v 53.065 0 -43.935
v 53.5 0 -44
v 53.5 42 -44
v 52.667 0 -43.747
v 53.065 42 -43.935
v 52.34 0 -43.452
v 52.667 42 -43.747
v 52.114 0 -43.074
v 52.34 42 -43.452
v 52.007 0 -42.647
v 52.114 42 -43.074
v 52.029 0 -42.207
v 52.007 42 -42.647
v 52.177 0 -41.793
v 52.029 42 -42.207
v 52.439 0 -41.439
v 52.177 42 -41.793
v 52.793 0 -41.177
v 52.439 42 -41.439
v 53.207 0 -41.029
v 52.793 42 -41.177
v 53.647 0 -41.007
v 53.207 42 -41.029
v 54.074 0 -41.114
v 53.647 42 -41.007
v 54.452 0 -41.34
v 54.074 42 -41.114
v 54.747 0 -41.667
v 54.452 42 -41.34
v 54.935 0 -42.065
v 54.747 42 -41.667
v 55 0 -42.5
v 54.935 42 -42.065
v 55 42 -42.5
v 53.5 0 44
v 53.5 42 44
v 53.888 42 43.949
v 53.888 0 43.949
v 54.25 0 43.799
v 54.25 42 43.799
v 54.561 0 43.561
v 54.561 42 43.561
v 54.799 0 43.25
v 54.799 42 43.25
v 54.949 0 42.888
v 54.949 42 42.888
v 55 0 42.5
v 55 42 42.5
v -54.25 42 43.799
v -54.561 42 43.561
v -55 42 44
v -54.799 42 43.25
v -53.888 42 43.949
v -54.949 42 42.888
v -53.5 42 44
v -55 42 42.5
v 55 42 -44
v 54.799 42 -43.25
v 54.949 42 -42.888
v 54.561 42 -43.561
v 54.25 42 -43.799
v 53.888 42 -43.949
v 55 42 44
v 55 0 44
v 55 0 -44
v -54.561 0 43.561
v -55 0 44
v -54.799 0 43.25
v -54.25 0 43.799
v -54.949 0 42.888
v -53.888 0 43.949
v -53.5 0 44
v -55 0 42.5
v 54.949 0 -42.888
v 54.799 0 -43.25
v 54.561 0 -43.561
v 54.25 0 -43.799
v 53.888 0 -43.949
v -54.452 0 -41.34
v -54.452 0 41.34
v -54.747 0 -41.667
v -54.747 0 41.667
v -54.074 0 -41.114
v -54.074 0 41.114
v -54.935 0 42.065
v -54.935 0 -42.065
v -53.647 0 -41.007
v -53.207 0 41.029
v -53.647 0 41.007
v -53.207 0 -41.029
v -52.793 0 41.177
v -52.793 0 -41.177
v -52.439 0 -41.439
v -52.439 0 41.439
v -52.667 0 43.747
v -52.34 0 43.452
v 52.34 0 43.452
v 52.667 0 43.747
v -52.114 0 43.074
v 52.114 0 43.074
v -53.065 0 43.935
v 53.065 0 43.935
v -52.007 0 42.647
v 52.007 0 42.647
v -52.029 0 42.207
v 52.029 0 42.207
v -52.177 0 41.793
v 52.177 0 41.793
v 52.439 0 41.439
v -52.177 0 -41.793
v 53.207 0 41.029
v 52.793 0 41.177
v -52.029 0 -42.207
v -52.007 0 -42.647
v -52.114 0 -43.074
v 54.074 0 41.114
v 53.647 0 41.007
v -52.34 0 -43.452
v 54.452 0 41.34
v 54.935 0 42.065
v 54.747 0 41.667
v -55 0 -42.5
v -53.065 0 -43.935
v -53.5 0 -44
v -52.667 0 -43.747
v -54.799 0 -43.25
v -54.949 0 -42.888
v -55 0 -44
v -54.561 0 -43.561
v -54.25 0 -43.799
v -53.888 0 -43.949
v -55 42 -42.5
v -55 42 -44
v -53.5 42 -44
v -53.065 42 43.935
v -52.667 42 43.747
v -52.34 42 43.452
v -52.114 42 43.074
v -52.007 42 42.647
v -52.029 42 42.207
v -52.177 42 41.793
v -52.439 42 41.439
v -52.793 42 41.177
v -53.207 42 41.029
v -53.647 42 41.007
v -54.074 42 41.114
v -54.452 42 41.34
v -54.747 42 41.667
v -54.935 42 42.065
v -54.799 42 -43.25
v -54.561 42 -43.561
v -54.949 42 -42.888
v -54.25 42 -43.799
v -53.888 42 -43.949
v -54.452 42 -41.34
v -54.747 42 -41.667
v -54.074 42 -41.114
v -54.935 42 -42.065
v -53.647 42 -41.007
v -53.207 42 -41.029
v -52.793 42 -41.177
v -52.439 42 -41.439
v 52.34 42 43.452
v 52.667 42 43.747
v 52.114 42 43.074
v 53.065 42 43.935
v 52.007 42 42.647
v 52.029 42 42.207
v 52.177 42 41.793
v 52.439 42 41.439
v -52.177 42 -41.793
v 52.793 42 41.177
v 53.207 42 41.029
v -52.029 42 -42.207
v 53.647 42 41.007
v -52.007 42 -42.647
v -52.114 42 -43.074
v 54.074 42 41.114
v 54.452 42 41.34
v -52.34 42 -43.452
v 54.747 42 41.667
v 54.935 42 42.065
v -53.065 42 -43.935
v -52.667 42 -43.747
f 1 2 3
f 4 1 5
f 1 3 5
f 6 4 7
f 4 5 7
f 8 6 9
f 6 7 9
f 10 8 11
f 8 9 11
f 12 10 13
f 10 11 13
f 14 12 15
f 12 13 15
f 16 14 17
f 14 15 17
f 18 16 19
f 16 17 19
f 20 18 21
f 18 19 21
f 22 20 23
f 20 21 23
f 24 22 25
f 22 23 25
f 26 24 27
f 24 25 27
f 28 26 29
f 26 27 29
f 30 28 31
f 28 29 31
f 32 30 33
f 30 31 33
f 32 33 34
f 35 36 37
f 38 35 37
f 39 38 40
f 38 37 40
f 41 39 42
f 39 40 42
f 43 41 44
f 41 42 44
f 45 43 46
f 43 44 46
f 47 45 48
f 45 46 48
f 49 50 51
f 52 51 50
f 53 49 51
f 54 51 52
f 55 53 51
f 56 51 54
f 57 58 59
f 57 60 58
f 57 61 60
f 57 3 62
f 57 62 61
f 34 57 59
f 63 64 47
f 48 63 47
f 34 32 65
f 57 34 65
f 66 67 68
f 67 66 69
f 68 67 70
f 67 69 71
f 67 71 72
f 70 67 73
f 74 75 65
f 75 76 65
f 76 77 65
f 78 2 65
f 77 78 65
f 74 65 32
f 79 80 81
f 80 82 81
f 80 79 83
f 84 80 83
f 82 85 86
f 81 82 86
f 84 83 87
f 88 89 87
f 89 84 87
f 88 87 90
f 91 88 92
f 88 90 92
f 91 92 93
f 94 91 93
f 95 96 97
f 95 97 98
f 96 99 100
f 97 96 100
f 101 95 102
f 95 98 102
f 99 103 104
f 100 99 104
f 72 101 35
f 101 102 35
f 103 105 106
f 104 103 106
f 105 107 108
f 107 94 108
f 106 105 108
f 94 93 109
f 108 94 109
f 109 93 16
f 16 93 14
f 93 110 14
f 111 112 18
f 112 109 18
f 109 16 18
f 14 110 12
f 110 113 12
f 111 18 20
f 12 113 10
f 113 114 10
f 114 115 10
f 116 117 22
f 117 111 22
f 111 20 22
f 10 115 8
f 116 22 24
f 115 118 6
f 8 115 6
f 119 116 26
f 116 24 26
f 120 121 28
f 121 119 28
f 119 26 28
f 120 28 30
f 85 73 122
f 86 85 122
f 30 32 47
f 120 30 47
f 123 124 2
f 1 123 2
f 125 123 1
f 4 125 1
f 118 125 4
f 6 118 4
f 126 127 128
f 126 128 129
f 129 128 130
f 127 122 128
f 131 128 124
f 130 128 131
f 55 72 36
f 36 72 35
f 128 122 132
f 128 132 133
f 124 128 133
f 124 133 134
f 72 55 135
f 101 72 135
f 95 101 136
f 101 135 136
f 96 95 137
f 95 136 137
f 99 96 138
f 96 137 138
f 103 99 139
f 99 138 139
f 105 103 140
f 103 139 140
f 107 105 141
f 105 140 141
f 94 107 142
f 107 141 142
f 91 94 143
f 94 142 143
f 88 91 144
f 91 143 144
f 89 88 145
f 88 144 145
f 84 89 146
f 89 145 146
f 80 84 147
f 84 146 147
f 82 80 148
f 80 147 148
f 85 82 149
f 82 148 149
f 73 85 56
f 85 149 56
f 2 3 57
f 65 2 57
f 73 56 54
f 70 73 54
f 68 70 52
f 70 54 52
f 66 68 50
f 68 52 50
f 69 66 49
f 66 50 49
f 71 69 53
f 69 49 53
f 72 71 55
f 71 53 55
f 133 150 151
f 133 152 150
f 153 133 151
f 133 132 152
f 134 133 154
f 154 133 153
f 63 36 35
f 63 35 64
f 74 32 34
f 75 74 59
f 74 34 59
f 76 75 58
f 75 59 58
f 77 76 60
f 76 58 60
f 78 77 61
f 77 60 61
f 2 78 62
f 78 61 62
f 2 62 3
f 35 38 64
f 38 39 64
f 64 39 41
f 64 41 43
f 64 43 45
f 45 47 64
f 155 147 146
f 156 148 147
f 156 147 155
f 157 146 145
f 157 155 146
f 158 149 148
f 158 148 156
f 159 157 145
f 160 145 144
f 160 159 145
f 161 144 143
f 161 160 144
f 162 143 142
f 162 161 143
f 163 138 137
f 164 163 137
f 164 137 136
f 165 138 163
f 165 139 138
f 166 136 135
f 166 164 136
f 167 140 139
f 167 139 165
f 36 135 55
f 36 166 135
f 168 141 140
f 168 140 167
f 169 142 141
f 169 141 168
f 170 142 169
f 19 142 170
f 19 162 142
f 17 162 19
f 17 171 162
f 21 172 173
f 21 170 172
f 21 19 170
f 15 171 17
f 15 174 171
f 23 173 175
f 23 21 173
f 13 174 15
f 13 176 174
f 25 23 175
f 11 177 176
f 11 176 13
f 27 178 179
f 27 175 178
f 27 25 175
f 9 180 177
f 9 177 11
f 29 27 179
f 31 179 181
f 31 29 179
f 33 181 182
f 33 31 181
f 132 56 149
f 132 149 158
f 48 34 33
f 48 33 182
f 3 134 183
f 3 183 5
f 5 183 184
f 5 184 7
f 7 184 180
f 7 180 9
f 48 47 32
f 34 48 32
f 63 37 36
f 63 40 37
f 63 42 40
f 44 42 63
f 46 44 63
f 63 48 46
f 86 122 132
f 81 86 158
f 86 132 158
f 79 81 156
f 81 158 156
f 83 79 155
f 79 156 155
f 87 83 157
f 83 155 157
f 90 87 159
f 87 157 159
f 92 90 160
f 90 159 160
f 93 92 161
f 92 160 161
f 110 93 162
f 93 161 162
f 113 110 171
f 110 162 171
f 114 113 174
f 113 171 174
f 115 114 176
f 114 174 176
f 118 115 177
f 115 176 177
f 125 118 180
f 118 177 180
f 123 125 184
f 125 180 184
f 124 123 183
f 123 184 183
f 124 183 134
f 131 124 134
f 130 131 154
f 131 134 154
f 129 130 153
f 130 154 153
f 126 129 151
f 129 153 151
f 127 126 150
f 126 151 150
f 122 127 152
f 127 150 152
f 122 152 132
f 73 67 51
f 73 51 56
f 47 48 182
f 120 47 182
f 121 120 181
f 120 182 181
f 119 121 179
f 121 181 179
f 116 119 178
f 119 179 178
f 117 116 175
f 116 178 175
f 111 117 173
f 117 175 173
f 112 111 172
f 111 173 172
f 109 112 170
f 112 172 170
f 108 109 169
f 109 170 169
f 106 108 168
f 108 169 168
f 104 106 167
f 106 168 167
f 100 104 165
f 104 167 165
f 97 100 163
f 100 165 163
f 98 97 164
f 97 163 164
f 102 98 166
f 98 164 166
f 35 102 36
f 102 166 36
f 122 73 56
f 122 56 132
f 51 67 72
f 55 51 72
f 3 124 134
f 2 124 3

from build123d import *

# Parameters (mm, degrees)
SKETCH_1_W          = 110
SKETCH_1_H          = 88
EXTRUDE_1_DEPTH     = 42
SKETCH_3_R          = 1.5
CUT_EXTRUDE_1_DEPTH = 83.006097334


with BuildPart() as part:
    # 草圖1 → 填料-伸長1 (new body)
    with BuildSketch(Plane(origin=(0, 0, 0), x_dir=(1, 0, 0), z_dir=(0, 1, 0))):
        Rectangle(SKETCH_1_W, SKETCH_1_H)
    extrude(amount=EXTRUDE_1_DEPTH)

    # 草圖3 → 除料-伸長1 (cut, through all)
    with BuildSketch(Plane(origin=(0, 42, 0), x_dir=(1, 0, 0), z_dir=(0, 1, 0))):
        with Locations((53.5, -42.5)):
            Circle(SKETCH_3_R)
        with Locations((53.5, 42.5)):
            Circle(SKETCH_3_R)
        with Locations((-53.5, 42.5)):
            Circle(SKETCH_3_R)
        with Locations((-53.5, -42.5)):
            Circle(SKETCH_3_R)
    extrude(amount=-CUT_EXTRUDE_1_DEPTH, mode=Mode.SUBTRACT)


solid = part.part
